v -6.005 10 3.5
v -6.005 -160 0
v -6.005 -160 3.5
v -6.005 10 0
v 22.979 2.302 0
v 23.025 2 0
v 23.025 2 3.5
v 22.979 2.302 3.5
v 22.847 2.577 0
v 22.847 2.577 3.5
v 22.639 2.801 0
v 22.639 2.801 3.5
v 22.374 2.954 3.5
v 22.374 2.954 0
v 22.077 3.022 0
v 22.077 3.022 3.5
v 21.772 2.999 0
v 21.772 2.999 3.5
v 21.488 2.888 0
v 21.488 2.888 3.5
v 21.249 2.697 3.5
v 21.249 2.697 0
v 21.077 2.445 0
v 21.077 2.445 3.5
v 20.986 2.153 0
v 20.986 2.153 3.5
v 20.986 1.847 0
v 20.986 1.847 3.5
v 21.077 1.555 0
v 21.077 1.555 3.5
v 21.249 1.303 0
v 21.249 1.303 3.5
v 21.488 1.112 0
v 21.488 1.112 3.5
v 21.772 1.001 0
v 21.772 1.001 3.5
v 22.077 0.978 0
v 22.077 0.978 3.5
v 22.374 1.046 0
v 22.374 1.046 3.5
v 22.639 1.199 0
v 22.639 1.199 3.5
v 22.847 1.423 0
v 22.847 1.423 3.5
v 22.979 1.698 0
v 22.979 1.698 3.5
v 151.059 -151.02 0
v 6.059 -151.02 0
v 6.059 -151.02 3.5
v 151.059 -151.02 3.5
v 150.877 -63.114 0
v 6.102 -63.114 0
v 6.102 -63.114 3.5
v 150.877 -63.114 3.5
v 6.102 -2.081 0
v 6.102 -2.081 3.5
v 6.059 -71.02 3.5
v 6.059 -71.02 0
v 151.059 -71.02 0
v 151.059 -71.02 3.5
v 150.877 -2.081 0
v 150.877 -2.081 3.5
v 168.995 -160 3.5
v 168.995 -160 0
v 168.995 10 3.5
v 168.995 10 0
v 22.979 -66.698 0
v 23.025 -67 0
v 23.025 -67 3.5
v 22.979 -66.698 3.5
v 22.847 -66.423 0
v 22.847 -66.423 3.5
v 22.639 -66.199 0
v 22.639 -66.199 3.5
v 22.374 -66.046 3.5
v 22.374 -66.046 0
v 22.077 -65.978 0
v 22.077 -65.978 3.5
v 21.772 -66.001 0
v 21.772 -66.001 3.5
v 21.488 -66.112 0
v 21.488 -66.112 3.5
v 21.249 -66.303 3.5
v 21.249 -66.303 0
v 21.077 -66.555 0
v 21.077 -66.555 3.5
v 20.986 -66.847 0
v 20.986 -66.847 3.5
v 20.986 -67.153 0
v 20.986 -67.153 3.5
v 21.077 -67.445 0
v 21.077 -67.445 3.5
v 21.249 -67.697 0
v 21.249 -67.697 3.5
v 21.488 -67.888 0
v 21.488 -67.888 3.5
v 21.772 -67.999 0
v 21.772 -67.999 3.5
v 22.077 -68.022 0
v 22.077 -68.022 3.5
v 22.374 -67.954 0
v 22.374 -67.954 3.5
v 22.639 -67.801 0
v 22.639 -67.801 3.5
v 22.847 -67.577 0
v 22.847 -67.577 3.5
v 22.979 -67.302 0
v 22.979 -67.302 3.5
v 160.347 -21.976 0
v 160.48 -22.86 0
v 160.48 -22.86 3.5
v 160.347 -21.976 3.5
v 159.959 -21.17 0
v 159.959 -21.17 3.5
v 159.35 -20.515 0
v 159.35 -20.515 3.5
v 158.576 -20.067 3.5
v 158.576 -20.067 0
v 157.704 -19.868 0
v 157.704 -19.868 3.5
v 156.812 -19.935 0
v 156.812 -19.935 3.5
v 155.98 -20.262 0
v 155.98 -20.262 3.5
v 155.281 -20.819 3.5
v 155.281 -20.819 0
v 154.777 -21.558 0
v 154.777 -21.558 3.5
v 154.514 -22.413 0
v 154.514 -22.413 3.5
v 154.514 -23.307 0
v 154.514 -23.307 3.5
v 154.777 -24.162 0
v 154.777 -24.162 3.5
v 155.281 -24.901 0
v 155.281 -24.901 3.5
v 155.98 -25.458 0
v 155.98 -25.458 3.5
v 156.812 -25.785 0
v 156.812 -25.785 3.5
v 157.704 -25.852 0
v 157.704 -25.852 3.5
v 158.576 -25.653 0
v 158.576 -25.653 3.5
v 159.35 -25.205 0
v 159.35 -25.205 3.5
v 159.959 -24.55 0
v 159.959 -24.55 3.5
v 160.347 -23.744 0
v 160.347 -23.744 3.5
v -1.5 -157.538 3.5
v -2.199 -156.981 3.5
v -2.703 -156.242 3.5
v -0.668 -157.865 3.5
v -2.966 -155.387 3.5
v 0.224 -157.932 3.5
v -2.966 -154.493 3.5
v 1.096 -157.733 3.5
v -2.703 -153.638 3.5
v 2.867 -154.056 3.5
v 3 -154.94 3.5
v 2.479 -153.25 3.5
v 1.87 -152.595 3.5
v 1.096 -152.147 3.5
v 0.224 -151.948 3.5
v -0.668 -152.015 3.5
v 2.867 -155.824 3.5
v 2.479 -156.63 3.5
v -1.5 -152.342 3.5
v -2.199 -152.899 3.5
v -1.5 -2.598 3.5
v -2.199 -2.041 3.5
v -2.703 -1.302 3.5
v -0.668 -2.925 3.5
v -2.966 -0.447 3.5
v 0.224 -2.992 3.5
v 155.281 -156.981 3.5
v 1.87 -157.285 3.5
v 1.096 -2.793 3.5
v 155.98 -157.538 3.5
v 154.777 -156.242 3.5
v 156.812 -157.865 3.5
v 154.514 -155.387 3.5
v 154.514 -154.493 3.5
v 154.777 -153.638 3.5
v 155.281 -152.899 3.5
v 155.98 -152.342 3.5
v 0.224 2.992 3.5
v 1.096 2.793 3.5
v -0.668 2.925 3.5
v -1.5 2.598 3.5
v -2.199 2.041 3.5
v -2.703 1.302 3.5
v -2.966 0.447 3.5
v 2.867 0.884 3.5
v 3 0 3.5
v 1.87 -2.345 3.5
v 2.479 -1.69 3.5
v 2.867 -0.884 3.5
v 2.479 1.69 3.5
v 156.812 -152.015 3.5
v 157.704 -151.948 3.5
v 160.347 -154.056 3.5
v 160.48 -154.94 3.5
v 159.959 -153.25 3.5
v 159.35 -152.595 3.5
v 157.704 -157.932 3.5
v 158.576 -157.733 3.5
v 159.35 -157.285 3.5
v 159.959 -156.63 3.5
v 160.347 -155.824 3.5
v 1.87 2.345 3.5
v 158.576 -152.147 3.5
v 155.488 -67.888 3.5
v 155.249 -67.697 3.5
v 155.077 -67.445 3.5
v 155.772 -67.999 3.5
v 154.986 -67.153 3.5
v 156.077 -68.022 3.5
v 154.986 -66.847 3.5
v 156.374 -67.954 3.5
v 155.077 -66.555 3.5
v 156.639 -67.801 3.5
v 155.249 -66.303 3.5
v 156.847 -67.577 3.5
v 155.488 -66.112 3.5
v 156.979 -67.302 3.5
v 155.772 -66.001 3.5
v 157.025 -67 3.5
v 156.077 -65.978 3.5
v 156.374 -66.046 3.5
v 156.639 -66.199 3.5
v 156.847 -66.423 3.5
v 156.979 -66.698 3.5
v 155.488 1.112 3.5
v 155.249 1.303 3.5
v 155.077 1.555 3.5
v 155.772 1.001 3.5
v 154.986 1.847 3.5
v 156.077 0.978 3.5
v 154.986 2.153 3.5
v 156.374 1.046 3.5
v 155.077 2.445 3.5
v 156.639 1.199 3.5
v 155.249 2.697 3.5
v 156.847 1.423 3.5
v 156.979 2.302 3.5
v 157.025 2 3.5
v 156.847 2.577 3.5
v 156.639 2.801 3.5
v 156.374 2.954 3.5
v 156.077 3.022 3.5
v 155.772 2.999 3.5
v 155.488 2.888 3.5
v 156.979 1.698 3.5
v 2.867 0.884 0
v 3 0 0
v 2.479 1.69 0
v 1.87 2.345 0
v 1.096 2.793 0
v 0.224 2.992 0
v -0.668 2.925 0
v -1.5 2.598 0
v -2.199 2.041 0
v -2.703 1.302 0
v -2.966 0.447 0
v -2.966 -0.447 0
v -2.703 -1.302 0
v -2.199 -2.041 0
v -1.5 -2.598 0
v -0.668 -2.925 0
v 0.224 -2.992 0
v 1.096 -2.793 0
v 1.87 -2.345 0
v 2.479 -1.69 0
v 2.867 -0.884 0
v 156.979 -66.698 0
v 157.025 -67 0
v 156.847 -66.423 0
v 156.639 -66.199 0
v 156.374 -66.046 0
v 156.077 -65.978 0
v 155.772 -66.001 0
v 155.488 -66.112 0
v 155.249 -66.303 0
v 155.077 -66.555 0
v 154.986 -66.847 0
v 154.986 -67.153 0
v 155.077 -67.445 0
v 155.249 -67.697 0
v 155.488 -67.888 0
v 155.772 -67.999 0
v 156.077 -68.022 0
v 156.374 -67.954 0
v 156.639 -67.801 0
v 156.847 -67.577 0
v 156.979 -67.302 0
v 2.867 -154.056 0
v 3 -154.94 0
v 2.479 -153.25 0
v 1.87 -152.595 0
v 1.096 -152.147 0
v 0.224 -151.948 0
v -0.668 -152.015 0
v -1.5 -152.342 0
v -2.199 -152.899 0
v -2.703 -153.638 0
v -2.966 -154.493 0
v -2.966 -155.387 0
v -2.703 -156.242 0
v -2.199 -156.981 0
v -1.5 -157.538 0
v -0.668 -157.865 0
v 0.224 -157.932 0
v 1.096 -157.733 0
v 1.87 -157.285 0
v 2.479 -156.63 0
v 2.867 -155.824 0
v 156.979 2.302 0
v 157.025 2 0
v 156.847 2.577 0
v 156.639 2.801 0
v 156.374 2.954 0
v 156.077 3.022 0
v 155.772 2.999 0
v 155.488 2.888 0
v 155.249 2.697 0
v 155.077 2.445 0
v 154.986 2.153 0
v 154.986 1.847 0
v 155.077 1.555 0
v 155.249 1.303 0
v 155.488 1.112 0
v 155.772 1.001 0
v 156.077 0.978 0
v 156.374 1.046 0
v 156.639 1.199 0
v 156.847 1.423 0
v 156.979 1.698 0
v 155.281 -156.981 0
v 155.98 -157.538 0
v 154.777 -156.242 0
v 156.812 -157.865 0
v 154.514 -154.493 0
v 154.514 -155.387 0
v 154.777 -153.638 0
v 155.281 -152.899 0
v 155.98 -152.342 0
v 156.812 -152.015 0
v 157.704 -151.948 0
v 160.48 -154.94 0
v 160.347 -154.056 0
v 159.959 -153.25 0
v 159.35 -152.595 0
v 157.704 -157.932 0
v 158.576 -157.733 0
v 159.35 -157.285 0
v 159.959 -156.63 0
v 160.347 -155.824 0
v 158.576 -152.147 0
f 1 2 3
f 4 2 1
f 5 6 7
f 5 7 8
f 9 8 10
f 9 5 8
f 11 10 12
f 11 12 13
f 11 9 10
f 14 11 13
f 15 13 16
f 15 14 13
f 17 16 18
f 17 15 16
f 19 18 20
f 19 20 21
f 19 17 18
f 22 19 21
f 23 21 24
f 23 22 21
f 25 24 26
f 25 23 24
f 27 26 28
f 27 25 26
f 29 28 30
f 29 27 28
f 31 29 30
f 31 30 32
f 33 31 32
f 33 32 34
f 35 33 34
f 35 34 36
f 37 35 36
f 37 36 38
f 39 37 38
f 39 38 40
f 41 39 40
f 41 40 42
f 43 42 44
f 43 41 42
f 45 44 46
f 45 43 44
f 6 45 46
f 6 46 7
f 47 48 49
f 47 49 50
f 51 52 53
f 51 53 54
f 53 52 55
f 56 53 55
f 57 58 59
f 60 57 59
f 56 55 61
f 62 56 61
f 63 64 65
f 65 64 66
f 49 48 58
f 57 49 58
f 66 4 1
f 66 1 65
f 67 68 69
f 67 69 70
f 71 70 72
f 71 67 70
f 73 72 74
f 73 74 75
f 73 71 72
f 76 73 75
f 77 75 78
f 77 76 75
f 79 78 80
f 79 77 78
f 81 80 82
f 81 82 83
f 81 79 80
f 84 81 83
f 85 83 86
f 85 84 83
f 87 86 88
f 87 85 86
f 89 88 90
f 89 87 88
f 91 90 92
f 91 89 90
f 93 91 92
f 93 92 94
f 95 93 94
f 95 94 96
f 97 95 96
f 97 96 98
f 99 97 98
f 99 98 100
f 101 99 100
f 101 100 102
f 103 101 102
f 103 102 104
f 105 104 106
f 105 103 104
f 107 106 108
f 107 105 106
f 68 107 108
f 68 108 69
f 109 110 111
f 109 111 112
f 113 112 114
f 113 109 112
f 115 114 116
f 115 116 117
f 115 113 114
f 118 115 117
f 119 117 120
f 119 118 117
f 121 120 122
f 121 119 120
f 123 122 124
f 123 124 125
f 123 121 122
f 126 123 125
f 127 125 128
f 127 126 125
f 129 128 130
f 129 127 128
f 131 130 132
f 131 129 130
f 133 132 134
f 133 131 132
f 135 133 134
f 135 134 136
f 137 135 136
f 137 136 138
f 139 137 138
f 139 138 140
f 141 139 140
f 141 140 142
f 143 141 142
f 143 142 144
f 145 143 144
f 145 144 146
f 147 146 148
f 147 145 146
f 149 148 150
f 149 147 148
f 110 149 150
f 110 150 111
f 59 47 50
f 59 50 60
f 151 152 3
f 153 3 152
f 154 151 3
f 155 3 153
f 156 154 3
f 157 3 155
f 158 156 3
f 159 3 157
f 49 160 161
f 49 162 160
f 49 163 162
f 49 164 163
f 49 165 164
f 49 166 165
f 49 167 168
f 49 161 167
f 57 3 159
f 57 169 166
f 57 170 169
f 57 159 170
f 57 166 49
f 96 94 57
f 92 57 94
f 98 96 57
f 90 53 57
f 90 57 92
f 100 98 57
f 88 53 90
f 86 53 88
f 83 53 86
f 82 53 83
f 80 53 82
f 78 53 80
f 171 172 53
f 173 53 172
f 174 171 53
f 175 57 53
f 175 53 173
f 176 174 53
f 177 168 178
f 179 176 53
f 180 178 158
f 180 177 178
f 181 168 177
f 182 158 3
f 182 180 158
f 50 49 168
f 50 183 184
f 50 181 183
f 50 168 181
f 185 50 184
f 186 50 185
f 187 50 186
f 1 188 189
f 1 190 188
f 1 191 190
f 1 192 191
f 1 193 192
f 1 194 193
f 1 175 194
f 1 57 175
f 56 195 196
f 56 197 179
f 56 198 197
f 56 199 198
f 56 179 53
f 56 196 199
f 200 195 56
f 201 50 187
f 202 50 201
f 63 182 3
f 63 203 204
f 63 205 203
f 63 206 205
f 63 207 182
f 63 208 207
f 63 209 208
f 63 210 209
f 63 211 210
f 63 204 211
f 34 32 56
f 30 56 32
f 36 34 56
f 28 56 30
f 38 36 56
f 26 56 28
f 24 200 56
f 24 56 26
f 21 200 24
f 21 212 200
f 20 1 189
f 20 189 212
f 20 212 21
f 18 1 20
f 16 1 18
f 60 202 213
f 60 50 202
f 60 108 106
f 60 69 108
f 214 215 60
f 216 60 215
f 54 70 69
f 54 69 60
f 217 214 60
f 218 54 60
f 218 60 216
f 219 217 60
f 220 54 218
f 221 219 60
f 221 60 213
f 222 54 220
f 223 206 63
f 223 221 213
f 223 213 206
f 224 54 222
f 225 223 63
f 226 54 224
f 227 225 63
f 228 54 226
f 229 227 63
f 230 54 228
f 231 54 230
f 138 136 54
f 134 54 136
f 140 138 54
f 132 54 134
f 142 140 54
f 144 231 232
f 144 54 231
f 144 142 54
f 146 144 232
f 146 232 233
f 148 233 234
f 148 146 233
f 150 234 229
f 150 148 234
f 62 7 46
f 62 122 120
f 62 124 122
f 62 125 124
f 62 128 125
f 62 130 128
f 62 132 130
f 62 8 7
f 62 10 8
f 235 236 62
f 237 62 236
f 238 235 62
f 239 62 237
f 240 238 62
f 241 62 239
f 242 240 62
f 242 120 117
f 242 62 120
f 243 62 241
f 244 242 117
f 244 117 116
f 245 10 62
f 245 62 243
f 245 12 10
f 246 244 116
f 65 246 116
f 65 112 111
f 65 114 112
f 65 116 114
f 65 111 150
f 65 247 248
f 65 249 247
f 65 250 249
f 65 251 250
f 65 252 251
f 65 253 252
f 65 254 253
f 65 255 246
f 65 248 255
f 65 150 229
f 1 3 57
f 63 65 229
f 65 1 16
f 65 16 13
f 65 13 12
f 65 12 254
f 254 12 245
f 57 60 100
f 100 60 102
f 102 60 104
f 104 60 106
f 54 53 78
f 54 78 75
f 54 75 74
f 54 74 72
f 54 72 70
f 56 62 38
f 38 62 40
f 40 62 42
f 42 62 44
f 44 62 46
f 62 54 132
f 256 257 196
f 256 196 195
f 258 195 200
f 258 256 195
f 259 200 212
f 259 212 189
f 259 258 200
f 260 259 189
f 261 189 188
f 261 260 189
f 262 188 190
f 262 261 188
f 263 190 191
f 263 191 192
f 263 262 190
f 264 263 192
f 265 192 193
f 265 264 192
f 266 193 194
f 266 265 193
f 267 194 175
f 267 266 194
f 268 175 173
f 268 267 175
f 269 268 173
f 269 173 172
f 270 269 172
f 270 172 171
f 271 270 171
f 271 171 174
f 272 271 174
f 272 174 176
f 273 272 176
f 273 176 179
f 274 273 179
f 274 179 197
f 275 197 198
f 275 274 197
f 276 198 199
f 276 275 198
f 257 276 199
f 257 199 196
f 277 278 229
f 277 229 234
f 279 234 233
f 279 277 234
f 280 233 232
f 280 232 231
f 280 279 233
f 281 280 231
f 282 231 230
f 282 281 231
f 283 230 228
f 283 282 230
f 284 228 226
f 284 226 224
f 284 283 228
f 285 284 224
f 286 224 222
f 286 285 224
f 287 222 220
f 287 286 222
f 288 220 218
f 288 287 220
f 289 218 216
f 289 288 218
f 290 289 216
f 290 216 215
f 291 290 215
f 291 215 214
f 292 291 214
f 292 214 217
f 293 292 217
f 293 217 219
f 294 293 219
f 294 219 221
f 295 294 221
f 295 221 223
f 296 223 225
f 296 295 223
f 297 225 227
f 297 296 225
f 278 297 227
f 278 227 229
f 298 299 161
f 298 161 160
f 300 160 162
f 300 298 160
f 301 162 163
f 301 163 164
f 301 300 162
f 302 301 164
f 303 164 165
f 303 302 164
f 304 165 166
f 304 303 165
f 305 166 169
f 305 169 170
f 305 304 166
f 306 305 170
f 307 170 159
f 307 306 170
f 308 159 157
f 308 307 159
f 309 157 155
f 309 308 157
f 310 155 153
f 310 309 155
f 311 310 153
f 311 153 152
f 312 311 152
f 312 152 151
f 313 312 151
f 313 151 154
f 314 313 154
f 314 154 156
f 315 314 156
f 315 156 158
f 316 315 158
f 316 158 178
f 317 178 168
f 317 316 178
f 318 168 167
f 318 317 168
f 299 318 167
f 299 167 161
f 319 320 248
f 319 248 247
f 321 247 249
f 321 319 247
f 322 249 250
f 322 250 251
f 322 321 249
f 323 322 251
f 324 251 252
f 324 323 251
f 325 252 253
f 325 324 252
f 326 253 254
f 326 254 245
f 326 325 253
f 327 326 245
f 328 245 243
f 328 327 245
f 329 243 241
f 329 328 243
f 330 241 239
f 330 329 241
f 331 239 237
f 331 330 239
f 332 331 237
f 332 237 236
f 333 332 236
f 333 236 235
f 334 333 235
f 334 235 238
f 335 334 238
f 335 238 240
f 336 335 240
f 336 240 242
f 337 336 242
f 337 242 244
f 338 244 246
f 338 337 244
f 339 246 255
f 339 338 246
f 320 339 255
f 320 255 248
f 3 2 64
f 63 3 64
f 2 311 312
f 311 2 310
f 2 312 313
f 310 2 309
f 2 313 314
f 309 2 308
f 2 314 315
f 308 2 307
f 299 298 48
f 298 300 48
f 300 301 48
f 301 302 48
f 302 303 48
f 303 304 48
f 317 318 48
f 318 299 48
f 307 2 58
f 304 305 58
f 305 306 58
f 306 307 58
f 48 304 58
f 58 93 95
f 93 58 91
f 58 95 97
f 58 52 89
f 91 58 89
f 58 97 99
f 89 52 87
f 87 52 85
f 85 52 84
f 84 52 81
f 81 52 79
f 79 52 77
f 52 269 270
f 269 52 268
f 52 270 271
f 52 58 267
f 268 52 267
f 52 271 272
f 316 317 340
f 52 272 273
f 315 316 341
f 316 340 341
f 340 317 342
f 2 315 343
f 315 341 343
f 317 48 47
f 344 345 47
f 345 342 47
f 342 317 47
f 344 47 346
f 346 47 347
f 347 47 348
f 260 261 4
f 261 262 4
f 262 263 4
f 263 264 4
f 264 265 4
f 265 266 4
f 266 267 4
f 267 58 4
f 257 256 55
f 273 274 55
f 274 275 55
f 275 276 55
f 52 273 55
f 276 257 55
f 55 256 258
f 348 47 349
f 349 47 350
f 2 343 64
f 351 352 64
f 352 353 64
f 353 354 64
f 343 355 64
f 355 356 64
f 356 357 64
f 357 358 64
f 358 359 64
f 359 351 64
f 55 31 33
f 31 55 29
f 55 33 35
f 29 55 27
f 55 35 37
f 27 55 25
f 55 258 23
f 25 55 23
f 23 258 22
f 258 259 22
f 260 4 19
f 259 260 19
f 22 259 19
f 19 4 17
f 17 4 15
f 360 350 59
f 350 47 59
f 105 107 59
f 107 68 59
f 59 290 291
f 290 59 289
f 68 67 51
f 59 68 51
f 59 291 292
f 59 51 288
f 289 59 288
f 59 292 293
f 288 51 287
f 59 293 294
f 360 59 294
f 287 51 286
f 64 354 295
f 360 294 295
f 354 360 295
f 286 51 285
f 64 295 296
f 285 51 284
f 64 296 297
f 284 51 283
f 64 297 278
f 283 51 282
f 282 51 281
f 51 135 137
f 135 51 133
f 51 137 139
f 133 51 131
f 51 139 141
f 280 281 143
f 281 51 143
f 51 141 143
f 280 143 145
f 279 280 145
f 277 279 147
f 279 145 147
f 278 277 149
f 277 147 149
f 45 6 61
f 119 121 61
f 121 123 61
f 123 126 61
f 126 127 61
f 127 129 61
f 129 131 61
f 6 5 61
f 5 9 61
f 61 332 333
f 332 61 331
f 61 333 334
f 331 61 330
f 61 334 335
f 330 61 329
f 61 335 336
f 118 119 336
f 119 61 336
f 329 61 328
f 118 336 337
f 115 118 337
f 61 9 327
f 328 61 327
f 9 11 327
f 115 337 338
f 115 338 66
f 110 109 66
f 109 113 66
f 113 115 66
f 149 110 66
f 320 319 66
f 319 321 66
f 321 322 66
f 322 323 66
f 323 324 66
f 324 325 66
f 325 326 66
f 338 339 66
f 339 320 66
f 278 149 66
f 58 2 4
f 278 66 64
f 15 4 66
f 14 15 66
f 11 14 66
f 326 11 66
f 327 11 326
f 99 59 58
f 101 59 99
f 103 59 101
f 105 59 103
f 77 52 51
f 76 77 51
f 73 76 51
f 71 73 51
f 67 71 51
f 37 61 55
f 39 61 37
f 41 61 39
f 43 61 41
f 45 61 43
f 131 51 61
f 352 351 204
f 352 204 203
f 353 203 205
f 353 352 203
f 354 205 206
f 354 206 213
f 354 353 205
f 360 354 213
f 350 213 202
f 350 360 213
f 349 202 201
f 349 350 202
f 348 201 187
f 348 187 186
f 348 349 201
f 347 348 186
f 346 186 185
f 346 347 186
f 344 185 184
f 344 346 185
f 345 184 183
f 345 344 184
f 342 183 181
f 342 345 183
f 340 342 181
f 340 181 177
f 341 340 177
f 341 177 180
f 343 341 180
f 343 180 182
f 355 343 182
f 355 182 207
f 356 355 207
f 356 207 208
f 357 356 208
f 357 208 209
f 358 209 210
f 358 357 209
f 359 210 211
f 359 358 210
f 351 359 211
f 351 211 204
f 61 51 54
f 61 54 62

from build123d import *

# Parameters (mm, degrees)
SKETCH_W   = 175
SKETCH_H   = 170
SKETCH_R   = 3
SKETCH_R_2 = 1.025
SKETCH_W_2 = 145
SKETCH_H_2 = 80
SKETCH_W_3 = 144.774735
SKETCH_H_3 = 61.033017
PAD_DEPTH  = 3.5


with BuildPart() as part:
    # Sketch → Pad (new body)
    with BuildSketch(Plane.XY):
        with Locations((81.49518, -75)):
            Rectangle(SKETCH_W, SKETCH_H)
        Circle(SKETCH_R, mode=Mode.SUBTRACT)
        with Locations((0, -154.94)):
            Circle(SKETCH_R, mode=Mode.SUBTRACT)
        with Locations((157.48, -22.86)):
            Circle(SKETCH_R, mode=Mode.SUBTRACT)
        with Locations((157.48, -154.94)):
            Circle(SKETCH_R, mode=Mode.SUBTRACT)
        with Locations((22, 2)):
            Circle(SKETCH_R_2, mode=Mode.SUBTRACT)
        with Locations((156, 2)):
            Circle(SKETCH_R_2, mode=Mode.SUBTRACT)
        with Locations((22, -67)):
            Circle(SKETCH_R_2, mode=Mode.SUBTRACT)
        with Locations((156, -67)):
            Circle(SKETCH_R_2, mode=Mode.SUBTRACT)
        with Locations((78.558894, -111.02028)):
            Rectangle(SKETCH_W_2, SKETCH_H_2, mode=Mode.SUBTRACT)
        with Locations((78.48973, -32.597599)):
            Rectangle(SKETCH_W_3, SKETCH_H_3, mode=Mode.SUBTRACT)
    extrude(amount=PAD_DEPTH)


solid = part.part
